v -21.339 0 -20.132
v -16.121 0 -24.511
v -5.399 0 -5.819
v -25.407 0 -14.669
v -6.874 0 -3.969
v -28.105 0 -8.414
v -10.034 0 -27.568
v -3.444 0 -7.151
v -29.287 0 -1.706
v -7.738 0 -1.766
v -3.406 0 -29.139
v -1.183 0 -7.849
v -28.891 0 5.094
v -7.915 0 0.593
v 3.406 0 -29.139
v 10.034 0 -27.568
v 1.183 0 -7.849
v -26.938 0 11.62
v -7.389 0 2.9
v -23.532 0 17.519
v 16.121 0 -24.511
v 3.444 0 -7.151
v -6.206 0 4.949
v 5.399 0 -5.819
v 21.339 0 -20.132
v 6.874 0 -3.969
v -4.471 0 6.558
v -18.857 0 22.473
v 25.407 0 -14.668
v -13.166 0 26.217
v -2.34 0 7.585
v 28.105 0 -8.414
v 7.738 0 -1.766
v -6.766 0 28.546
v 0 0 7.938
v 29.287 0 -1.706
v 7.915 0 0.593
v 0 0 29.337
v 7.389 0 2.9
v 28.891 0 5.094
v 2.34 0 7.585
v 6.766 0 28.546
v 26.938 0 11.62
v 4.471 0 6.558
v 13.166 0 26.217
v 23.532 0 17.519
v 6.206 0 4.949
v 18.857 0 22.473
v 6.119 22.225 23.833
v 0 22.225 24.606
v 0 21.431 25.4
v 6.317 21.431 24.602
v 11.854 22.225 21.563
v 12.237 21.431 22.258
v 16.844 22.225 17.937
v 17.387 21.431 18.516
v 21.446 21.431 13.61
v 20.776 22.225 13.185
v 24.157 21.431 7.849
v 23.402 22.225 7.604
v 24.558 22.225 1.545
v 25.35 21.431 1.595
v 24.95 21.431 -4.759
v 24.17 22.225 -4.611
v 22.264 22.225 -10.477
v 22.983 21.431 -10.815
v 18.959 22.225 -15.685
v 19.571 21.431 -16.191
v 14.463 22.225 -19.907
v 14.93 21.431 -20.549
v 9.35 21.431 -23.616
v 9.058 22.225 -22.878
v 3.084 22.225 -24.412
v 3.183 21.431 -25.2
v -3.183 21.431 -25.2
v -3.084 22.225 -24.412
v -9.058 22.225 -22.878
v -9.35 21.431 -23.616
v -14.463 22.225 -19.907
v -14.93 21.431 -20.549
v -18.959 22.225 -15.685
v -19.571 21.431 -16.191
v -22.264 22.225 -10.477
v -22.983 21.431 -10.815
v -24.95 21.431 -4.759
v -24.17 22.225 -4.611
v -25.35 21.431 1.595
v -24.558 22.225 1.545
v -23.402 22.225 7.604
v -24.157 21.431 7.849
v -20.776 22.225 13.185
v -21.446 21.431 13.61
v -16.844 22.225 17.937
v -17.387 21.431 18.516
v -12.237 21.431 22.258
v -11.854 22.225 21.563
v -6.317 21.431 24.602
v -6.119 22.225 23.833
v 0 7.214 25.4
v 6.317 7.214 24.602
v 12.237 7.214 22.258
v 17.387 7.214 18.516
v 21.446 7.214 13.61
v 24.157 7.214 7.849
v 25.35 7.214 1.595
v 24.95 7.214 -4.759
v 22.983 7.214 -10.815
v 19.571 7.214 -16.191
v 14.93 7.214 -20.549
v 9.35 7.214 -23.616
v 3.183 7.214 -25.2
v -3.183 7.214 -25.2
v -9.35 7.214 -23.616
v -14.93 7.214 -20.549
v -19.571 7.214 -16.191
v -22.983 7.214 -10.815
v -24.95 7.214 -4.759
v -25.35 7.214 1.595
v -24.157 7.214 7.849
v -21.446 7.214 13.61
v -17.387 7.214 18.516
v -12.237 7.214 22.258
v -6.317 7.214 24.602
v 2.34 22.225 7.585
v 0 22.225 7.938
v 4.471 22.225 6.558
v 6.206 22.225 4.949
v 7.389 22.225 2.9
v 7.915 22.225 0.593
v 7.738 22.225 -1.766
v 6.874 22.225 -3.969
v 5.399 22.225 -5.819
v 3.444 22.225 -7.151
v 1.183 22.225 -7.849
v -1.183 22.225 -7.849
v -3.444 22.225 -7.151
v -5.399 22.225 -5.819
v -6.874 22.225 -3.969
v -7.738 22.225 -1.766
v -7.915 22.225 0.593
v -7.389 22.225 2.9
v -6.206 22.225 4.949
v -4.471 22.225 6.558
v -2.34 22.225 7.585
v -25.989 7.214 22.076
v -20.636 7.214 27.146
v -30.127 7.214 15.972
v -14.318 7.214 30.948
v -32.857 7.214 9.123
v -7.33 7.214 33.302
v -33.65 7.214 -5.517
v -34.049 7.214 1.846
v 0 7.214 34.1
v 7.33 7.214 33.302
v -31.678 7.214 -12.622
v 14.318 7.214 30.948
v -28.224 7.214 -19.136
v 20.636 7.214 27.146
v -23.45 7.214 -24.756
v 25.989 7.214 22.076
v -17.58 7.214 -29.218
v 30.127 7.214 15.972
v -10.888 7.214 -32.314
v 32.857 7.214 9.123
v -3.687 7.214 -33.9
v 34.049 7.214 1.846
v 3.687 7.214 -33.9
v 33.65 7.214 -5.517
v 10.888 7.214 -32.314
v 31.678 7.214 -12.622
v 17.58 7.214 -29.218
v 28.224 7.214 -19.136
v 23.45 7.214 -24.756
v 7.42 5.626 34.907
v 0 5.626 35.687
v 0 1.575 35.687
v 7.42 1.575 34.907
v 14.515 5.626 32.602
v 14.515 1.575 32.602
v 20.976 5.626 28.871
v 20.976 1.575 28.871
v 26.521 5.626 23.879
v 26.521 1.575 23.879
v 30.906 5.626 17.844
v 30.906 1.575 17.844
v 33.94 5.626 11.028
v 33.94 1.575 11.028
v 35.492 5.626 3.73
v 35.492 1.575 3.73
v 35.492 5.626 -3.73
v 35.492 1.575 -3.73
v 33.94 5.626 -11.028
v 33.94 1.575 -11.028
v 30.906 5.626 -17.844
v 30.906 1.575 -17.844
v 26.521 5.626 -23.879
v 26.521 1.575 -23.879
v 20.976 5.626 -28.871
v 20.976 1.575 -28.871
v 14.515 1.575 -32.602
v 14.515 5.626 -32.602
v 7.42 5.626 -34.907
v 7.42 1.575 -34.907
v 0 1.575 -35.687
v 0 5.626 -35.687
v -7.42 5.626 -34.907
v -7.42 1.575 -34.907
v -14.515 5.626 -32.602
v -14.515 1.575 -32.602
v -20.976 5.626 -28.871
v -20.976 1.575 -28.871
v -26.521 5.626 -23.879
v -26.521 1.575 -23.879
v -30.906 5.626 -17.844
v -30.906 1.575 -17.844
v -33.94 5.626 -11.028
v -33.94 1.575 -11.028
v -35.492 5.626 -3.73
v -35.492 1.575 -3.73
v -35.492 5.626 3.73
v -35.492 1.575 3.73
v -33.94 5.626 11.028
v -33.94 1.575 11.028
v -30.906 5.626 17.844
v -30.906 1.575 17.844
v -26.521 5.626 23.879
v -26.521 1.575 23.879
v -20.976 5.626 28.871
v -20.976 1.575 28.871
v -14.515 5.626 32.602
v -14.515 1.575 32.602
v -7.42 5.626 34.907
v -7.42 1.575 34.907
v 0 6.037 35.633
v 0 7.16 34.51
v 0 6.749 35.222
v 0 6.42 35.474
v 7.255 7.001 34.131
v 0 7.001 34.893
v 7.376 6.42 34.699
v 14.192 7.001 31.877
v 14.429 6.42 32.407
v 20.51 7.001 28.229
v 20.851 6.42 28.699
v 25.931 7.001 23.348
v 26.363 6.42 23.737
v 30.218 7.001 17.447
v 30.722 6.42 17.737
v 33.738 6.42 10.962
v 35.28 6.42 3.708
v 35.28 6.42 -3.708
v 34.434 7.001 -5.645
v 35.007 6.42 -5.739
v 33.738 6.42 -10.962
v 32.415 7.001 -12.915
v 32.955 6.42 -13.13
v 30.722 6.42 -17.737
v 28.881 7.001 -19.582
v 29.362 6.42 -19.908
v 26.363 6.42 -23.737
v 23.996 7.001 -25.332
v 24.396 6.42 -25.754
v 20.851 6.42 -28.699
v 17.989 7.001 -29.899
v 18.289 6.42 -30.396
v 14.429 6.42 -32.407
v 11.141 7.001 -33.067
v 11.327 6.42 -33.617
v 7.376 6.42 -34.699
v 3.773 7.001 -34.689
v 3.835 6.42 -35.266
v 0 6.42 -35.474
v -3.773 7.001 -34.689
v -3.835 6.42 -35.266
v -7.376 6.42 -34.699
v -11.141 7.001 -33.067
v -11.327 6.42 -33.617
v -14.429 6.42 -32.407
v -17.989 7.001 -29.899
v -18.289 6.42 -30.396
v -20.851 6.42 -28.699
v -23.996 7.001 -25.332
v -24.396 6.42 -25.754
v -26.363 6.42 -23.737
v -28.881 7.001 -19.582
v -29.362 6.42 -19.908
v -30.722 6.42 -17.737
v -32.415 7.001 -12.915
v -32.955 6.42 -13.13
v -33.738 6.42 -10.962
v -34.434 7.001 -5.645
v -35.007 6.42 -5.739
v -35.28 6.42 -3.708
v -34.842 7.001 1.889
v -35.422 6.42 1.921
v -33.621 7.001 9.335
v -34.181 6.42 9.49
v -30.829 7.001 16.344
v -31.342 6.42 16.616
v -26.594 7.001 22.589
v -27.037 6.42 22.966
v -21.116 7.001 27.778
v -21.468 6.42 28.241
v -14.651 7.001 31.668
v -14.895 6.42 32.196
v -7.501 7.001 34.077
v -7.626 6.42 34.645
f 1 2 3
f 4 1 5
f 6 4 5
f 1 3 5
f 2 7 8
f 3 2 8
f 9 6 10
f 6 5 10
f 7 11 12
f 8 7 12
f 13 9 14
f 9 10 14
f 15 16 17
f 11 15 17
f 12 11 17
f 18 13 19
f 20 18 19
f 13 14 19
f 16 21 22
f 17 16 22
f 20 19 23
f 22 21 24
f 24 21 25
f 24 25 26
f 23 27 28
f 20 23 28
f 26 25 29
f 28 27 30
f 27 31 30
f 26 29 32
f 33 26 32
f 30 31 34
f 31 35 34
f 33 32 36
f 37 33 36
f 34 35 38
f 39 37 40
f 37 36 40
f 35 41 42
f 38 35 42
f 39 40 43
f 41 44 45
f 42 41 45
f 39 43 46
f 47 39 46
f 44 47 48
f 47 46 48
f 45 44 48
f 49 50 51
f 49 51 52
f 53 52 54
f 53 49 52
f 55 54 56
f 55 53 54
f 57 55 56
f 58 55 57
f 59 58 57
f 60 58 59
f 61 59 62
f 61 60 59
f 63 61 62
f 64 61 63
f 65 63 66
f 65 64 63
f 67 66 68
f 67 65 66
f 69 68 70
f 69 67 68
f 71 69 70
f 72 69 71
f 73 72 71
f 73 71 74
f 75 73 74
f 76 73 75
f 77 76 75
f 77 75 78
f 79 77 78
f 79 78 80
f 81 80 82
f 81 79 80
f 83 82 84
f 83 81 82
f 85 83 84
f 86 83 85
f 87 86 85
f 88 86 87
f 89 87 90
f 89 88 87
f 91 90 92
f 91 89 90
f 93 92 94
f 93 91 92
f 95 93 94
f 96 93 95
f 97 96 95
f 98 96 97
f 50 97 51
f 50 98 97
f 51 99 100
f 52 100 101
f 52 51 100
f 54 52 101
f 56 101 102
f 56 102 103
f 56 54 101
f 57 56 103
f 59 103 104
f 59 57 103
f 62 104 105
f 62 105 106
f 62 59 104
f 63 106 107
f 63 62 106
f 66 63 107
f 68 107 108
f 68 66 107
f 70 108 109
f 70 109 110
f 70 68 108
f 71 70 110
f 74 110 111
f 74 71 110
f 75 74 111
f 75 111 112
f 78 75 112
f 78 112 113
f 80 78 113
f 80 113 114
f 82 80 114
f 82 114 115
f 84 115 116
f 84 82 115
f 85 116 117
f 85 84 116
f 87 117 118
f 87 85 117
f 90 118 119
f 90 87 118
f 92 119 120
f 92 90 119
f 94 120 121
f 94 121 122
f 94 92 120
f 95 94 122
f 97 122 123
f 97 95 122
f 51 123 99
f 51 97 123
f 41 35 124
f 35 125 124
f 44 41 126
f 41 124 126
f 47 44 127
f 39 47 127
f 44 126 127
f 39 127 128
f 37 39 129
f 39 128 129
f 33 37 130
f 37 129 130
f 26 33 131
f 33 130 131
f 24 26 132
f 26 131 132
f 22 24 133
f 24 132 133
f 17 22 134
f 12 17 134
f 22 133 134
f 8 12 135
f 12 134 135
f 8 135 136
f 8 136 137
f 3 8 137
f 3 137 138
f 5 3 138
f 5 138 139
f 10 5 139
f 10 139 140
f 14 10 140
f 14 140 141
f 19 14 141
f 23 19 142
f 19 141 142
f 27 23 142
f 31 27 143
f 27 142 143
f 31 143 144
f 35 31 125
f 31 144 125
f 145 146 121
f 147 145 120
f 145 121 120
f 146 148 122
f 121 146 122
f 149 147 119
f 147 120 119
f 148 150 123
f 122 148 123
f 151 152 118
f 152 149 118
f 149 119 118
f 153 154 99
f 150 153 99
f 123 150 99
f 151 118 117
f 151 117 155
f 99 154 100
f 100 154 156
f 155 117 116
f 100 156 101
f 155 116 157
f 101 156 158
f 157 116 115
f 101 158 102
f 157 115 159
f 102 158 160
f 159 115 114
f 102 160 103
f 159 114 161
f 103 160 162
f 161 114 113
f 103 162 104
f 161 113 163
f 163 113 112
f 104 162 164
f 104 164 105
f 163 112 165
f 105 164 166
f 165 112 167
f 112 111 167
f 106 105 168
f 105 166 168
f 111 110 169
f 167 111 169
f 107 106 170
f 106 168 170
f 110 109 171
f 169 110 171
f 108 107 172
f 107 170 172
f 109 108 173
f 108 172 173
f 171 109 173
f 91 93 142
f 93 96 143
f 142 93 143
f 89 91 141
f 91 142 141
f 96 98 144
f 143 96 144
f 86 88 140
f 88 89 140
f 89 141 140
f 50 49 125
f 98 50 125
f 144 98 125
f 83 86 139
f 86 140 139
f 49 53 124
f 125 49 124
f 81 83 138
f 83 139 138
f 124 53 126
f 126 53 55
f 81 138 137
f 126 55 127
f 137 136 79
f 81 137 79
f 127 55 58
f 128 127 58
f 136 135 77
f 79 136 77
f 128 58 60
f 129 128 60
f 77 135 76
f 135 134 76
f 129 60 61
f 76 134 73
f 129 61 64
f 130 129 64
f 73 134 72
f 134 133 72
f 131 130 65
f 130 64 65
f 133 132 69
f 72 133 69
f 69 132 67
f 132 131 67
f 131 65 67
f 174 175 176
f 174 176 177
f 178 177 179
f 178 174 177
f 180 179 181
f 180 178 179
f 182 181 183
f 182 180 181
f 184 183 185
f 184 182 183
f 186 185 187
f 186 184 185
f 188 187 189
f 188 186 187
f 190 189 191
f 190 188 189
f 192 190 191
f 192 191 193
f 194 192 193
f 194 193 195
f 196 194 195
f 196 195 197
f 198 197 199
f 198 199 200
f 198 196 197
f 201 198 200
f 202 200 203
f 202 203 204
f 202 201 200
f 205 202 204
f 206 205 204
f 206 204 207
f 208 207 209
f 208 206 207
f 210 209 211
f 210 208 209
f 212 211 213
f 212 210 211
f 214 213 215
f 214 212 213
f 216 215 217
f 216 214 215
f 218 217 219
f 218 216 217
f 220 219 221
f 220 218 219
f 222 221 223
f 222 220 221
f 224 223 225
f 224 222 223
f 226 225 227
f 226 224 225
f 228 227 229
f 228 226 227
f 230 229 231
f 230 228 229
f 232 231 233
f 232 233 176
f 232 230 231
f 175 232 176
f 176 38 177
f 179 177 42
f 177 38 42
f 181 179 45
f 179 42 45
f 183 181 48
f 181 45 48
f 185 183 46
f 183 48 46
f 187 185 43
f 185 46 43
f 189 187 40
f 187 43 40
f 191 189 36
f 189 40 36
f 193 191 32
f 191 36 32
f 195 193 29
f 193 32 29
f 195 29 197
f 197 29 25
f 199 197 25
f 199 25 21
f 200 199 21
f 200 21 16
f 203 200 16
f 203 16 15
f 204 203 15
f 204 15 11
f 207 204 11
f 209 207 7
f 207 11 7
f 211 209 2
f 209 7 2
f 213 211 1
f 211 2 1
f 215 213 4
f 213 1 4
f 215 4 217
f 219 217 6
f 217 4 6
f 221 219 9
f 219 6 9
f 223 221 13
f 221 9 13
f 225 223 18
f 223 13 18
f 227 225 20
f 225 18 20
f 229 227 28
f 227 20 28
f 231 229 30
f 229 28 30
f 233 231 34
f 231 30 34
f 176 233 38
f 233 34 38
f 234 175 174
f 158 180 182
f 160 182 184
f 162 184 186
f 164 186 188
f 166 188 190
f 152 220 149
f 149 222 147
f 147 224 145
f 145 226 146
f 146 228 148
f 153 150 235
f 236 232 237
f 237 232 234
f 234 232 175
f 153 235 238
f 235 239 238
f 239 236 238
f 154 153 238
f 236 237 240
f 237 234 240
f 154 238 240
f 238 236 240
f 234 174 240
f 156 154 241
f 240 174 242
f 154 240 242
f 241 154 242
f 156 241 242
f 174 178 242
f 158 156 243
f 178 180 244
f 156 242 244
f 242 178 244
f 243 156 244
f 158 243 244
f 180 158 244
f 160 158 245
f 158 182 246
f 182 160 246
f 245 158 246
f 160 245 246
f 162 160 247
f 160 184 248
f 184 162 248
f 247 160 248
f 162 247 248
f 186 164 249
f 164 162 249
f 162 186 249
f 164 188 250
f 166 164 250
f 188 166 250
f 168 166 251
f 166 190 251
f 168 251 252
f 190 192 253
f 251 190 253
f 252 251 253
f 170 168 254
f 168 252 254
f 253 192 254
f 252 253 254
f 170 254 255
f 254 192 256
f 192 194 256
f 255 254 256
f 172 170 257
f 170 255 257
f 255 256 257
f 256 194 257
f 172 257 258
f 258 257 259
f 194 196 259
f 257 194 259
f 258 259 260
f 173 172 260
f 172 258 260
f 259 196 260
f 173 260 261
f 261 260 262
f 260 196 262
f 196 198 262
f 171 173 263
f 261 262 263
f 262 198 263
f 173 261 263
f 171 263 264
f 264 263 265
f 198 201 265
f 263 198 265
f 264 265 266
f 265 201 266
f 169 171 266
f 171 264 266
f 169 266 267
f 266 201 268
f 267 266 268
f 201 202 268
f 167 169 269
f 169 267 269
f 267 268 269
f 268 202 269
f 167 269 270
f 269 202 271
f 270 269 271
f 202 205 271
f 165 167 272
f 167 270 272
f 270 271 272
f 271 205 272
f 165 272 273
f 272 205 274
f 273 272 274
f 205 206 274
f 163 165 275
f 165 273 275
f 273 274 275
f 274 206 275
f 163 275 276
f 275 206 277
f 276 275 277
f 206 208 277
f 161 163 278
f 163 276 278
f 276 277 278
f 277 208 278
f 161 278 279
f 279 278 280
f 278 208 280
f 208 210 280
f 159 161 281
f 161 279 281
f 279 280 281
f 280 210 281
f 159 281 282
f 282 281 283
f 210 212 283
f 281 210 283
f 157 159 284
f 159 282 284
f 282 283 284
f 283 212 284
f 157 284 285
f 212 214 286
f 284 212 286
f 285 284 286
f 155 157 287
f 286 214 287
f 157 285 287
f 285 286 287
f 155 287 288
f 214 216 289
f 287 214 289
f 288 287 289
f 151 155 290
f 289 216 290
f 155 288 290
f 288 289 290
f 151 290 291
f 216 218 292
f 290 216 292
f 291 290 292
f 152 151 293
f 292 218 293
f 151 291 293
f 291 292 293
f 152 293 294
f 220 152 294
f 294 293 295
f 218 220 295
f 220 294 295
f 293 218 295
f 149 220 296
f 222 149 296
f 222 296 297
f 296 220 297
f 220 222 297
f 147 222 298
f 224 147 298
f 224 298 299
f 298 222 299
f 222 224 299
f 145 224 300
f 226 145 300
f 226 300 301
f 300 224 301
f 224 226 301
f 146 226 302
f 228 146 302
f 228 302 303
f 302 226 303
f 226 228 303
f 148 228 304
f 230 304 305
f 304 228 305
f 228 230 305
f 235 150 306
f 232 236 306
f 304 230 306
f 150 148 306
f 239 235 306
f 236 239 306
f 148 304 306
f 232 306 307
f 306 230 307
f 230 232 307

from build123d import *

# Parameters (mm, degrees)
F0_W     = 7.2136
F0_H     = 10.287
F0_H_2   = 17.4625
F0_W_2   = 15.0114
F2_R     = 1.5875
F3_SIZE  = 0.79375
F4_SIZE2 = 6.35
F4_SIZE  = 1.5748


with BuildPart() as f1:
    # F0 (on Right) → F1 (revolve)
    with BuildSketch(Plane.YZ):
        with Locations((3.6068, 30.5435)):
            Rectangle(F0_W, F0_H)
        with Locations((3.6068, 16.66875)):
            Rectangle(F0_W, F0_H_2)
        with Locations((14.7193, 16.66875)):
            Rectangle(F0_W_2, F0_H_2)
    revolve(axis=Axis((0, 6.4671109096, 0), (0, 1, 0)))

    # F2
    f2_edges = [f1.edges().sort_by_distance(p)[0] for p in [
        (0, 7.2136, -35.687),
    ]]
    fillet(f2_edges, radius=F2_R)

    # F3
    f3_edges = [f1.edges().sort_by_distance(p)[0] for p in [
        (0, 22.225, -25.4),
    ]]
    chamfer(f3_edges, length=F3_SIZE)

    # F4
    f4_edges = [f1.edges().sort_by_distance(p)[0] for p in [
        (0, 0, -35.687),
        (0, 5.6261, -35.687),
    ]]
    f4_side = f1.faces().sort_by_distance((0, 2.81305, -35.687))[0]
    chamfer(f4_edges, length=F4_SIZE, length2=F4_SIZE2, reference=f4_side)


solid = f1.part
